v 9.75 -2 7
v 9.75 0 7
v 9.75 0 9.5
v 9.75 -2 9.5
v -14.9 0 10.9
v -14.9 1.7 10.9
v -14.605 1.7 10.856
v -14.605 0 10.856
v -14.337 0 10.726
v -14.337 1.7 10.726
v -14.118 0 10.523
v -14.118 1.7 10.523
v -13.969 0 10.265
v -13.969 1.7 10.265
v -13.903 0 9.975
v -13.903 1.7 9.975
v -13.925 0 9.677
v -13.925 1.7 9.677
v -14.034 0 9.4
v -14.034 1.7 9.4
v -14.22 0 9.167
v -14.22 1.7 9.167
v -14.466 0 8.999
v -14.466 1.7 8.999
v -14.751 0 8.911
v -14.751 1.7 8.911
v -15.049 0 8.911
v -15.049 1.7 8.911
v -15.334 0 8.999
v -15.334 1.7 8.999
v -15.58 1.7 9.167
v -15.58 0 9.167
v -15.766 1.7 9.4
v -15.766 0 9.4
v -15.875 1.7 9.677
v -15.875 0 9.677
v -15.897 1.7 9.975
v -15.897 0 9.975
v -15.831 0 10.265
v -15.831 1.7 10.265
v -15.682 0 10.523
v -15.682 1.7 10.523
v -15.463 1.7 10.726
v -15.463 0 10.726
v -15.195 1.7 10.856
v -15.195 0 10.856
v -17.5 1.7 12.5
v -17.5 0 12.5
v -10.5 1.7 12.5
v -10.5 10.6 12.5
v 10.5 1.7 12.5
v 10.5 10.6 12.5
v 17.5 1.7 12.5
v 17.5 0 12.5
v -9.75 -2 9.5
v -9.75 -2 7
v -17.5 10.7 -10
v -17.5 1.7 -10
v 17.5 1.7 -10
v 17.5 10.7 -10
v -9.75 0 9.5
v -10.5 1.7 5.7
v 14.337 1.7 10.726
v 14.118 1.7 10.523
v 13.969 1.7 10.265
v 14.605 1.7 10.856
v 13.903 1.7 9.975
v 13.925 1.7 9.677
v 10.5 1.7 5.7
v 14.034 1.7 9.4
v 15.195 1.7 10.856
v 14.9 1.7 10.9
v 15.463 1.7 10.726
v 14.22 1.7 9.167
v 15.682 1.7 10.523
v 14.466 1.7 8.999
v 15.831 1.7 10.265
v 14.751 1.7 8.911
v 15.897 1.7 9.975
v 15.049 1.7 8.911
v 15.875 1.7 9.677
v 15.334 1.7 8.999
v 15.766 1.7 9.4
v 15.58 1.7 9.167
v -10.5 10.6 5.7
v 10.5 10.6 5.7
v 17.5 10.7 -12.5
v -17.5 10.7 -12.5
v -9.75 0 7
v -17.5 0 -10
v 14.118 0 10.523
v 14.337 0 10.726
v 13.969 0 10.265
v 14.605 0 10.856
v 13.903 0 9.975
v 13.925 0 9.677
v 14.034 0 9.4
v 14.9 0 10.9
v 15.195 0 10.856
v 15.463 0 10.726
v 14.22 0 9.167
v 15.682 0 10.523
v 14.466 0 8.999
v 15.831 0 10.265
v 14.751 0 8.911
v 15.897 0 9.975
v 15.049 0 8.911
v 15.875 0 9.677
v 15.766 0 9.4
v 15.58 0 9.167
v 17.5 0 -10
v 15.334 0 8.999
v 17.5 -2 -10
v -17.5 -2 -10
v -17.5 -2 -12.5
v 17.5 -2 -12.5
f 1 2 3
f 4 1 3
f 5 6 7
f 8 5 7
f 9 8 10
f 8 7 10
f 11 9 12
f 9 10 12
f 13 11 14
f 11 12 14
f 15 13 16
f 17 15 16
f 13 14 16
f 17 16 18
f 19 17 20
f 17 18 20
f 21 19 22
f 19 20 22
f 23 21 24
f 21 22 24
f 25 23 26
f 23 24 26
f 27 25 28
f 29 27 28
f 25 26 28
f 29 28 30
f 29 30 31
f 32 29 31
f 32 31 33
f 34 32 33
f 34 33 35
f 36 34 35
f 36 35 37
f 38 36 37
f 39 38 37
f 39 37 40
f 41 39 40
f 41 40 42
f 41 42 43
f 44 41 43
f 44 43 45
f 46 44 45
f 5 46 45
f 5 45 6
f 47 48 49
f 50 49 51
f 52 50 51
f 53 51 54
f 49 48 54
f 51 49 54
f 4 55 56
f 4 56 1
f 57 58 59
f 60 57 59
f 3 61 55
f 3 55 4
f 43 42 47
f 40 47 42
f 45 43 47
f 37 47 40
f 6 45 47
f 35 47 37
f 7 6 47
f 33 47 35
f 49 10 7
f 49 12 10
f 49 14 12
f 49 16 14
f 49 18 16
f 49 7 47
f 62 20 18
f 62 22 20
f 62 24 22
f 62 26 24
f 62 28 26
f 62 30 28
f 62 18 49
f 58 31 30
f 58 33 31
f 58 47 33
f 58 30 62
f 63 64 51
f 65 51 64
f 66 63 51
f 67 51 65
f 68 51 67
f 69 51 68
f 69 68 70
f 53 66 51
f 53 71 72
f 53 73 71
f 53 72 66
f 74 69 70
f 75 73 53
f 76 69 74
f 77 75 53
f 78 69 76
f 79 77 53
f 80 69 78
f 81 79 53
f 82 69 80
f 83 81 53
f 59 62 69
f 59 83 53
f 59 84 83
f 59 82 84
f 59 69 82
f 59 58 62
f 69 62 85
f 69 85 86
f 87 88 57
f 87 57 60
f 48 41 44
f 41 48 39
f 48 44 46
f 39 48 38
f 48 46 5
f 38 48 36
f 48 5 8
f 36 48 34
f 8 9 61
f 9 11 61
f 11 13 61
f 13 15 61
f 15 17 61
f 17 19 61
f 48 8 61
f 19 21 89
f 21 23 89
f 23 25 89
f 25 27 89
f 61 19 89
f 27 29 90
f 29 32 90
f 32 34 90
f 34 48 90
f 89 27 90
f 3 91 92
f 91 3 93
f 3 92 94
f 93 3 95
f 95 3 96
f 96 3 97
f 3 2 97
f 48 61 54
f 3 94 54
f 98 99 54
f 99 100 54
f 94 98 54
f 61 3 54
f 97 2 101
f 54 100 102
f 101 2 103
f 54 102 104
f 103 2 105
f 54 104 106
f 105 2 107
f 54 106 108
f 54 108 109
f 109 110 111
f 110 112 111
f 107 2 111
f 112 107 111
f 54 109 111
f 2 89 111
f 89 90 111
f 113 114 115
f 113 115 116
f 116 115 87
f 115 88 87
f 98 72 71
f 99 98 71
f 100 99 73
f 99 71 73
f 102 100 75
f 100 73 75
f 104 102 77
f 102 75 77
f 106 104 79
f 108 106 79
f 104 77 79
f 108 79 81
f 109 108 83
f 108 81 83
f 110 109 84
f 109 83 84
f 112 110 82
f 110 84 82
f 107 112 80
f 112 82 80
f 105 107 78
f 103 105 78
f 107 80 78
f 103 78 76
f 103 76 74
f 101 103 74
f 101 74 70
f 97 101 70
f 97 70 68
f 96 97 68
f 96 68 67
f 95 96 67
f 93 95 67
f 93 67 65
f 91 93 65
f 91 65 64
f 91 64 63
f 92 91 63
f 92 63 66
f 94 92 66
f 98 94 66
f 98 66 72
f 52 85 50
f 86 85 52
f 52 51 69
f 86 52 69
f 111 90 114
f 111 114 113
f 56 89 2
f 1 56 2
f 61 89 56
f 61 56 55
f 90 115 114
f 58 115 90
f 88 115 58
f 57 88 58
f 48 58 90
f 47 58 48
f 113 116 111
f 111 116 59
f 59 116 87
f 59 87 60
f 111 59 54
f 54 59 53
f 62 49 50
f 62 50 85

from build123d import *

# Parameters (mm, degrees)
SKETCH1_W           = 35
SKETCH1_H           = 25
BOSS_EXTRUDE1_DEPTH = 1.7
SKETCH2_W           = 21
SKETCH2_H           = 6.8
BOSS_EXTRUDE2_DEPTH = 8.9
SKETCH3_W           = 35
SKETCH3_H           = 2.5
BOSS_EXTRUDE3_DEPTH = 9
SKETCH4_W           = 35
SKETCH4_H           = 2.5
SKETCH4_W_2         = 19.5
BOSS_EXTRUDE4_DEPTH = 2
CUT_EXTRUDE1_REACH  = 25.313
SKETCH5_R           = 1


with BuildPart() as part:
    # Sketch1 → Boss-Extrude1 (new body)
    with BuildSketch(Plane(origin=(0, 0, 0), x_dir=(1, 0, 0), z_dir=(0, 1, 0))):
        Rectangle(SKETCH1_W, SKETCH1_H)
    extrude(amount=BOSS_EXTRUDE1_DEPTH)

    # Sketch2 → Boss-Extrude2 (add)
    with BuildSketch(Plane(origin=(0, 1.7, 0), x_dir=(1, 0, 0), z_dir=(0, 1, 0))):
        with Locations((0, -9.1)):
            Rectangle(SKETCH2_W, SKETCH2_H)
    extrude(amount=BOSS_EXTRUDE2_DEPTH)

    # Sketch3 → Boss-Extrude3 (add)
    with BuildSketch(Plane(origin=(0, 1.7, 0), x_dir=(1, 0, 0), z_dir=(0, 1, 0))):
        with Locations((0, 11.25)):
            Rectangle(SKETCH3_W, SKETCH3_H)
    extrude(amount=BOSS_EXTRUDE3_DEPTH)

    # Sketch4 → Boss-Extrude4 (add)
    with BuildSketch(Plane.XZ):
        with Locations((0, -11.25)):
            Rectangle(SKETCH4_W, SKETCH4_H)
        with Locations((0, 8.25)):
            Rectangle(SKETCH4_W_2, SKETCH4_H)
    extrude(amount=BOSS_EXTRUDE4_DEPTH)

    # Sketch5 → Cut-Extrude1 (cut, up to next)
    with BuildSketch(Plane(origin=(0, 1.7, 0), x_dir=(1, 0, 0), z_dir=(0, 1, 0)), mode=Mode.PRIVATE) as cut_extrude1_sk1:
        with Locations(Location((14.9, -9.9, 0), (0, 0, 270))):
            Circle(SKETCH5_R)
    cut_extrude1_tool1 = extrude(cut_extrude1_sk1.sketch, amount=-CUT_EXTRUDE1_REACH, mode=Mode.PRIVATE) & part.part
    # Sketch5 → Cut-Extrude1 (cut, up to next)
    with BuildSketch(Plane(origin=(0, 1.7, 0), x_dir=(1, 0, 0), z_dir=(0, 1, 0)), mode=Mode.PRIVATE) as cut_extrude1_sk2:
        with Locations(Location((-14.9, -9.9, 0), (0, 0, 270))):
            Circle(SKETCH5_R)
    cut_extrude1_tool2 = extrude(cut_extrude1_sk2.sketch, amount=-CUT_EXTRUDE1_REACH, mode=Mode.PRIVATE) & part.part
    add(cut_extrude1_tool1.solids().sort_by_distance((14.9, 1.7, 9.9))[0], mode=Mode.SUBTRACT)
    add(cut_extrude1_tool2.solids().sort_by_distance((-14.9, 1.7, 9.9))[0], mode=Mode.SUBTRACT)


solid = part.part
